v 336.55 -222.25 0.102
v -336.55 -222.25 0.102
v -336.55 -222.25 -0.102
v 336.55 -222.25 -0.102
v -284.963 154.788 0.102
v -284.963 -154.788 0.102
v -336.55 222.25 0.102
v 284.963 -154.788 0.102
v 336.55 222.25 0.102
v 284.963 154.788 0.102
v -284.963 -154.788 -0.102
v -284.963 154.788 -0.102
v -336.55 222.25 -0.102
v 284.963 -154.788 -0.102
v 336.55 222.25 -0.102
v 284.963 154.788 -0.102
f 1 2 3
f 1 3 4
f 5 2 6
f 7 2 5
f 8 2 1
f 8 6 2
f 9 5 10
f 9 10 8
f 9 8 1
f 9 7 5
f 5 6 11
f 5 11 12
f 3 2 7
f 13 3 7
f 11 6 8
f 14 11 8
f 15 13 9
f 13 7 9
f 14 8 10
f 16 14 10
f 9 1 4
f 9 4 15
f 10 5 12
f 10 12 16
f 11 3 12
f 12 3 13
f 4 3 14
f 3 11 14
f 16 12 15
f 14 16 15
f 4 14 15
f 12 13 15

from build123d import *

# Parameters (mm, degrees)
SKETCH1_W               = 673.1
SKETCH1_H               = 444.5
BOSS_EXTRUDE1_DEPTH     = 0.1016
SKETCH2_W               = 569.9252
SKETCH2_H               = 309.5752
CUT_EXTRUDE1_DEPTH      = 1
CUT_EXTRUDE1_DEPTH_BACK = 1.2032


with BuildPart() as part:
    # Sketch1 → Boss-Extrude1 (new body, symmetric)
    with BuildSketch(Plane.XY):
        Rectangle(SKETCH1_W, SKETCH1_H)
    extrude(amount=BOSS_EXTRUDE1_DEPTH, both=True)

    # Sketch2 → Cut-Extrude1 (cut, two sides)
    with BuildSketch(Plane.XY.offset(0.1016)) as cut_extrude1_sk:
        Rectangle(SKETCH2_W, SKETCH2_H)
    extrude(amount=CUT_EXTRUDE1_DEPTH, mode=Mode.SUBTRACT)
    extrude(cut_extrude1_sk.sketch, amount=-CUT_EXTRUDE1_DEPTH_BACK, mode=Mode.SUBTRACT)


solid = part.part
